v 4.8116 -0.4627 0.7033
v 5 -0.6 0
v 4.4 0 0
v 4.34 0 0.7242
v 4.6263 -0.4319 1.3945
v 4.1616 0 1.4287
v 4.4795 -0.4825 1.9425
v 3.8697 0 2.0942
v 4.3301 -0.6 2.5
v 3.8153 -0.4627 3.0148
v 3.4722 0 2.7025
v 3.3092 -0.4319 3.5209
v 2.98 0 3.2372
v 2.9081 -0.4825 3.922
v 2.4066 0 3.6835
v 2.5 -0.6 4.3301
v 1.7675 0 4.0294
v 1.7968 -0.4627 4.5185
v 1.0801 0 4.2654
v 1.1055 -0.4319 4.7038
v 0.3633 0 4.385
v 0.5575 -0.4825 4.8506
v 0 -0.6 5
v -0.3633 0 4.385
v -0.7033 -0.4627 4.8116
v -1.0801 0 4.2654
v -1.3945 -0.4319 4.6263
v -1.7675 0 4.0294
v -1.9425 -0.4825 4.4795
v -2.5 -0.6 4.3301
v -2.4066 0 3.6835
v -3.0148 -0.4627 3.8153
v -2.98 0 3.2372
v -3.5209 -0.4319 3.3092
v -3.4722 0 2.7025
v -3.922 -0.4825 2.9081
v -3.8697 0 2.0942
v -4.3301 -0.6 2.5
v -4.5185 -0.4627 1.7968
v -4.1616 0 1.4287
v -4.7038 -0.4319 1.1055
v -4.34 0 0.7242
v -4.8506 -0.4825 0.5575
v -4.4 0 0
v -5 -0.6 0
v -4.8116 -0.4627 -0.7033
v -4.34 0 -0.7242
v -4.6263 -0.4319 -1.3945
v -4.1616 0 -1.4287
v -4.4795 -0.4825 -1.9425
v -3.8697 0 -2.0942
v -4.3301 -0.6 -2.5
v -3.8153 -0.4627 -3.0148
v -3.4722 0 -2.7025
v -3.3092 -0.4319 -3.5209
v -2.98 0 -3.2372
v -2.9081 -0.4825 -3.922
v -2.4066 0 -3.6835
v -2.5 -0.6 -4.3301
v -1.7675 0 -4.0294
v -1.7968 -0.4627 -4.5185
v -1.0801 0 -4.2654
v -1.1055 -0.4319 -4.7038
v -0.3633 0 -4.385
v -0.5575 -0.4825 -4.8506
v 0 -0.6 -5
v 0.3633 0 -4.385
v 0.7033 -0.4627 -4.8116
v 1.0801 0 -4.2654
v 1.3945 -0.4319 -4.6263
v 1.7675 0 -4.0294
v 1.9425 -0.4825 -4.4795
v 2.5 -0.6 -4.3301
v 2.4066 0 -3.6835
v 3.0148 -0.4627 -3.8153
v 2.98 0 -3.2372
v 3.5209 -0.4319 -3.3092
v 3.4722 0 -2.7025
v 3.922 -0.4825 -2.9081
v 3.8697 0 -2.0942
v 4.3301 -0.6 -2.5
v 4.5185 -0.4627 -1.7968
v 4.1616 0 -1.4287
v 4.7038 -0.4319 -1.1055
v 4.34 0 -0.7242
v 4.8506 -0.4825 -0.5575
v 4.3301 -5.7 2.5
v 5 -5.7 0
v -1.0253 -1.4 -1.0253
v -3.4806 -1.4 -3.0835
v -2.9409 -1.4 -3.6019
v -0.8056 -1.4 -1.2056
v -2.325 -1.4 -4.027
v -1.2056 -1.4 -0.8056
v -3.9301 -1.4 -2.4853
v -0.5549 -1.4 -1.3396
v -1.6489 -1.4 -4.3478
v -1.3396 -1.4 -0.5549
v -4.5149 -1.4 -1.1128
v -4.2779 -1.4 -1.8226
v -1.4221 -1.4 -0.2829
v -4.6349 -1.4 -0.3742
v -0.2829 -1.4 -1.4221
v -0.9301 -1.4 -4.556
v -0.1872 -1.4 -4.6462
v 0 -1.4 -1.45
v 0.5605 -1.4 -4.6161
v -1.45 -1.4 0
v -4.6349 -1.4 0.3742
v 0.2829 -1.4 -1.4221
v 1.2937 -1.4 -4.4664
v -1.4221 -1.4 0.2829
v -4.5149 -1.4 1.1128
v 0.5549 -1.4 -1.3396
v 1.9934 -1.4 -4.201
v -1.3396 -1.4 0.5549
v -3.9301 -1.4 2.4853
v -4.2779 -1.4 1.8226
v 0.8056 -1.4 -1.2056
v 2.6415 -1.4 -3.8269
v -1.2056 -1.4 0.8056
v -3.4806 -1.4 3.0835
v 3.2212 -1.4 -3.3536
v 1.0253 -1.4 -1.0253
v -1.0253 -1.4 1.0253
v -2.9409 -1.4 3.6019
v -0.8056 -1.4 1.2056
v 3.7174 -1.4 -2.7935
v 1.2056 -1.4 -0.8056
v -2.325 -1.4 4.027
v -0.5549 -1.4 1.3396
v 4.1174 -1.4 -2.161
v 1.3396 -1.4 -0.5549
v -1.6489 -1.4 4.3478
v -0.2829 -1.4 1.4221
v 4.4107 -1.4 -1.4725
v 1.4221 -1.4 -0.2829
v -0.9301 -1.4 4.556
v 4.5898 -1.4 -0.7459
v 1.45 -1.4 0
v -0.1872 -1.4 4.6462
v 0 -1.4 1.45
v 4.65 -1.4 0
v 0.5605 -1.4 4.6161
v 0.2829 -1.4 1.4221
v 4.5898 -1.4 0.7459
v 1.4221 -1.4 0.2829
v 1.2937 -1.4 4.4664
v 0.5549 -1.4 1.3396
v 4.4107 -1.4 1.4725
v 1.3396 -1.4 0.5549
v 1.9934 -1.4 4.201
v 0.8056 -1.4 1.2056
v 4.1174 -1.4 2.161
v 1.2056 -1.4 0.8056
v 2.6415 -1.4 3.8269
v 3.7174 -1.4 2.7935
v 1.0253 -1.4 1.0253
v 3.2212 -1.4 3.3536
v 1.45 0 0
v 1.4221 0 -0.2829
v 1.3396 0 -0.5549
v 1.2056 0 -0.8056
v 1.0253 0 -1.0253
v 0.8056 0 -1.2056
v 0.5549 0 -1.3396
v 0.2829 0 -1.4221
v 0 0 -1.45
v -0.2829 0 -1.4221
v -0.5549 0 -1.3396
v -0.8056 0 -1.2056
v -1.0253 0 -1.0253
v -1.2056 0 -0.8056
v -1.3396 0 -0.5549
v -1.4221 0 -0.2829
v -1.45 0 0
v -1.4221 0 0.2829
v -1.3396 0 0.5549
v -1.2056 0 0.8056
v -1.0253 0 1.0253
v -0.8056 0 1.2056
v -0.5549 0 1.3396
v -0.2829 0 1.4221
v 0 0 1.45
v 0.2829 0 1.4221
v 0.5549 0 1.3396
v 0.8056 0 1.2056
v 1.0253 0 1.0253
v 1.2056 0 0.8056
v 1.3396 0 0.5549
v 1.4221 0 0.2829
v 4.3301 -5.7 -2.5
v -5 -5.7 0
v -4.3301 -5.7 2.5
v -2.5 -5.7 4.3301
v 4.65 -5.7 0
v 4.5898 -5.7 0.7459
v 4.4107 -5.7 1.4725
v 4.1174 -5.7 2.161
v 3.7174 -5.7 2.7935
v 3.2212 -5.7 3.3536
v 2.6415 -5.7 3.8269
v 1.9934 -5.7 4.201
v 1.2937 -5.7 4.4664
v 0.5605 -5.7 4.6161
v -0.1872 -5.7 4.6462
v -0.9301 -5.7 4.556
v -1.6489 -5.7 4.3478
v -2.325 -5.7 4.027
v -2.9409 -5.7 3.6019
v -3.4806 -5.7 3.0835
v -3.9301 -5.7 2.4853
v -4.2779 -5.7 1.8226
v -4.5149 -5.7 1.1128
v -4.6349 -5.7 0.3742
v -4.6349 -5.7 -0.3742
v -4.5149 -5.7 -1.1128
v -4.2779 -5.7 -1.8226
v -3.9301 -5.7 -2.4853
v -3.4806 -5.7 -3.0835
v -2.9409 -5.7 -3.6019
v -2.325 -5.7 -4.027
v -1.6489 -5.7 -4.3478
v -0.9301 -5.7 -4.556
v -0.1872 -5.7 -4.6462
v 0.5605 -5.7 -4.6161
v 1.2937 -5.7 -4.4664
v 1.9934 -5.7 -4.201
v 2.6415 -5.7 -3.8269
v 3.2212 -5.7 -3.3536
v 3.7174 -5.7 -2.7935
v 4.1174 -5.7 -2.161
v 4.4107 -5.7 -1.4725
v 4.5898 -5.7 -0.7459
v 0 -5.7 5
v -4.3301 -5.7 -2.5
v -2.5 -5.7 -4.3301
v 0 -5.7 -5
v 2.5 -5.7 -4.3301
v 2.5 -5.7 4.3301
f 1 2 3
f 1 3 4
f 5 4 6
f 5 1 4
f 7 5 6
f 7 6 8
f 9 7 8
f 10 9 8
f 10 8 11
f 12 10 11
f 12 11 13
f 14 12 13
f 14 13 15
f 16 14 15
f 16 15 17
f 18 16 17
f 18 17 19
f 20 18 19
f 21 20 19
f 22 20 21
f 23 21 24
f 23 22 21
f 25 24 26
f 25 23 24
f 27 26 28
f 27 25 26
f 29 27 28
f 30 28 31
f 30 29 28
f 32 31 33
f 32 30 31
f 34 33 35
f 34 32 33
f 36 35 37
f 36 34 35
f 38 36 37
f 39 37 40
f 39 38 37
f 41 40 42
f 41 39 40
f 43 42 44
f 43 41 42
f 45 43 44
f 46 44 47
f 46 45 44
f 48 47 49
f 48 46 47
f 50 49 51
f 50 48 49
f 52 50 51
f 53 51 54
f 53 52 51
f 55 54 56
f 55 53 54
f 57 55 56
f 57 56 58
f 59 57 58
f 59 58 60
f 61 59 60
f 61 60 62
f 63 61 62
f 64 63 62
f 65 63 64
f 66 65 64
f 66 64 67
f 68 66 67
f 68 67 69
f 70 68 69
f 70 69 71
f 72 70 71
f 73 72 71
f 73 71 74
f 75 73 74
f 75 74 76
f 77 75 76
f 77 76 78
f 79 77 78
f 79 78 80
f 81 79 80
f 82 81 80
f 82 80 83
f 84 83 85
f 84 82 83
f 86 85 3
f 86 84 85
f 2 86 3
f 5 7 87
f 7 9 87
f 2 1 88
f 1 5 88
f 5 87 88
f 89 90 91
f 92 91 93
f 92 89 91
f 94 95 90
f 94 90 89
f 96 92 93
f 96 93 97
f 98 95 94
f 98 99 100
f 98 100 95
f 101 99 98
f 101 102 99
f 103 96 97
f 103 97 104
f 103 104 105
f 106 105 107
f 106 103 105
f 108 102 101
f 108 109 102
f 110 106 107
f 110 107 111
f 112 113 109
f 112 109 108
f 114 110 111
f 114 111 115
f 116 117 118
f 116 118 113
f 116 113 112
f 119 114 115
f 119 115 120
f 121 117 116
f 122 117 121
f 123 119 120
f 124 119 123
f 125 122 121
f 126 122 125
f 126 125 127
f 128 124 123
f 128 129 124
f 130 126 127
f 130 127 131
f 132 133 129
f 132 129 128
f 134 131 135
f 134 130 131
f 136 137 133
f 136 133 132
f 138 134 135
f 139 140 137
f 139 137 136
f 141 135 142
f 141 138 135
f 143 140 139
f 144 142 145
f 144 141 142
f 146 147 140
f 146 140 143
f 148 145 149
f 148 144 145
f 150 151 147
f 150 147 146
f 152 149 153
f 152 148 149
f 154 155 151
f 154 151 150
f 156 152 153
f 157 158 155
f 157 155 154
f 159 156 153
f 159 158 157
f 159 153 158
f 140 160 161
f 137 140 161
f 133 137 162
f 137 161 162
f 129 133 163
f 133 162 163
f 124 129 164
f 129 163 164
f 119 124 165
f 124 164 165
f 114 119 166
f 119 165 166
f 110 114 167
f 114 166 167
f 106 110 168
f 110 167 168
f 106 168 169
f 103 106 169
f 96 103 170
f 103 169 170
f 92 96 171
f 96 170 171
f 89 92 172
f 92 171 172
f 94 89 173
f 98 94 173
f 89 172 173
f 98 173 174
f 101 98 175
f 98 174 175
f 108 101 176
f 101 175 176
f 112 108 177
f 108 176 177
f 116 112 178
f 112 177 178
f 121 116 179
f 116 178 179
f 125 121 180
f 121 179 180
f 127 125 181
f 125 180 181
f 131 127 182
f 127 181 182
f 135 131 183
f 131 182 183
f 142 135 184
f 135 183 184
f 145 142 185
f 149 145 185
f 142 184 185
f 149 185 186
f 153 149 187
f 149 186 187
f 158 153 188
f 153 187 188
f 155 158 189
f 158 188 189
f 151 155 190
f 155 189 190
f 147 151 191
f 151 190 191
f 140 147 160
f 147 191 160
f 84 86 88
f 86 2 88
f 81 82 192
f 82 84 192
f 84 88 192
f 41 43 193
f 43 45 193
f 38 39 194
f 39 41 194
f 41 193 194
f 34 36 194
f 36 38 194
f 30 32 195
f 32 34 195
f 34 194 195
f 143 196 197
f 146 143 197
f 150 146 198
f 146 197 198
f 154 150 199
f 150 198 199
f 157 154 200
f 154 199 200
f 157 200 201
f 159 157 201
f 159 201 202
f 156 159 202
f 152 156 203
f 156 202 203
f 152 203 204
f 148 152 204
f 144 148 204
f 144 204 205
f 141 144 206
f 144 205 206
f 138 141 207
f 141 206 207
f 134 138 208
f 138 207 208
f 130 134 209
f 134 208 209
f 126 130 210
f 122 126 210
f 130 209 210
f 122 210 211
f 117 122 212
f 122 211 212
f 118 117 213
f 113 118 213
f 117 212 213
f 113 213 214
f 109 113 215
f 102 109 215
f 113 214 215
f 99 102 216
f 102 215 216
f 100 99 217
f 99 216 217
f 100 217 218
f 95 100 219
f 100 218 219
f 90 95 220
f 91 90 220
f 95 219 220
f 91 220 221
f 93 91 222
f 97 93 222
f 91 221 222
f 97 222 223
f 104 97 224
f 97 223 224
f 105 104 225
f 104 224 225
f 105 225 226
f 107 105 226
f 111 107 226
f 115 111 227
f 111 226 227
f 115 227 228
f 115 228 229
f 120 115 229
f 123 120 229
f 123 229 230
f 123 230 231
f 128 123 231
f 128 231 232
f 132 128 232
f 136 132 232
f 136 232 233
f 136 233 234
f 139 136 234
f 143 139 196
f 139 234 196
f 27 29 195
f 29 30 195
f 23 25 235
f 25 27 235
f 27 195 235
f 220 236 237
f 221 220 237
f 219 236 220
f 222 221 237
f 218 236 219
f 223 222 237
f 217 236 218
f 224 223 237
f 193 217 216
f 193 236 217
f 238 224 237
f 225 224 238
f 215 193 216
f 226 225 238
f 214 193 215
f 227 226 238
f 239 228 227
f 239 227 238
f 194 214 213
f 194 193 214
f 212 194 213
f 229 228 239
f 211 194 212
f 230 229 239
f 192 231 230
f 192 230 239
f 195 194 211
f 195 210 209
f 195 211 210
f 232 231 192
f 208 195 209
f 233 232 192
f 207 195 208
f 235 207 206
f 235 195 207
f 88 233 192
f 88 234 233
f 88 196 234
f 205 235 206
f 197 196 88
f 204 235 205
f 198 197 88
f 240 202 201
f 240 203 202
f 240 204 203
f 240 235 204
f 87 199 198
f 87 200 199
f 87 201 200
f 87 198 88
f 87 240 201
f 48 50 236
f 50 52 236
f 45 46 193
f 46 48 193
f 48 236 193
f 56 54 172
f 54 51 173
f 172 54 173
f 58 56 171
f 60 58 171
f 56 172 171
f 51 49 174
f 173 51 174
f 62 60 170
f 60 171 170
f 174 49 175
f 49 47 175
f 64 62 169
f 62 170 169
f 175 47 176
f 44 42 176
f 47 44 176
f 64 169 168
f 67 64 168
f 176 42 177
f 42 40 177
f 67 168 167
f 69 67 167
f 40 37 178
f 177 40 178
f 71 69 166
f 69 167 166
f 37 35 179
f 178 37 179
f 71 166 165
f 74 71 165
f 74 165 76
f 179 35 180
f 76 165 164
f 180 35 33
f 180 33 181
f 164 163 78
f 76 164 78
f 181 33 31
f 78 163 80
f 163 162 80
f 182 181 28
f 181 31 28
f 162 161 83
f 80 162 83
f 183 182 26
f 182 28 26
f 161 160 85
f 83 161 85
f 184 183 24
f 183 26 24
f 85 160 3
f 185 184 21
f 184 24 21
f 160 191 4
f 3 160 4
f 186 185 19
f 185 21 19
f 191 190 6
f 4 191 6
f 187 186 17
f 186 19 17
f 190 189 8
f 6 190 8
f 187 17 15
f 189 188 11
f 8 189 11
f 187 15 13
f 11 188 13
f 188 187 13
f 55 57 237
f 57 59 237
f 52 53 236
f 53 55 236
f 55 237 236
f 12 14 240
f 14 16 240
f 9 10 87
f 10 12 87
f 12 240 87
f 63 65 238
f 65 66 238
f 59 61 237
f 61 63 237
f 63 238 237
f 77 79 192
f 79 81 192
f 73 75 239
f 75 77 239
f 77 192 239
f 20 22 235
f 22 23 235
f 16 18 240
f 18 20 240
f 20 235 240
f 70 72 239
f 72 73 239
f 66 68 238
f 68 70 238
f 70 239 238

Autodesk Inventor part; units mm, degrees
ref_plane "YZ Plane" through (0, 0, 0) normal (1, 0, 0) x (0, 1, 0)
ref_plane "XZ Plane" through (0, 0, 0) normal (0, 1, 0) x (-1, 0, 0)
ref_plane "XY Plane" through (0, 0, 0) normal (0, 0, 1) x (1, 0, 0)
sketch "Boceto1" plane through (0, 0, 0) normal (0, 1, 0) x (-1, 0, 0)
  circle A0 centre (0, 0) radius 1.45
  dimension "d3" = 2.9
extrude "Extrusión1" add sketch "Boceto1" along normal blind 25
sketch "Boceto3" plane through (0, 0, 0) normal (0, -1, 0) x (1, 0, 0)
  circle A0 centre (0, 0) radius 5
  dimension "d5" = 10
extrude "Extrusión2" add sketch "Boceto3" along normal blind 5.7
chamfer "Chaflán1" distance 0.6 angle 45 1 edges at (-5, 0, 0)
sketch "Boceto5" plane through (0, -5.7, 0) normal (0, -1, 0) x (1, 0, 0)
  line L0 (0, 0) -> (0, 5) construction
  line L1 (0, 0) -> (5, 0) construction
  line L2 (0, 0) -> (4.3301, -2.5) construction
  line L3 (0, 0) -> (5, 0) construction
  line L4 (0, 0) -> (2.5, -4.3301) construction
  line L5 (0, 0) -> (5, 0) construction
  line L6 (0, 0) -> (0, -5) construction
  line L7 (0, 0) -> (5, 0) construction
  line L8 (0, 0) -> (-5, 0) construction
  line L9 (0, 0) -> (-5, 0) construction
  line L10 (0, 0) -> (-4.3301, -2.5) construction
  line L11 (0, 0) -> (-2.5, -4.3301) construction
  line L12 (0, 0) -> (4.3301, 2.5) construction
  line L13 (0, 0) -> (2.5, 4.3301) construction
  line L14 (0, 0) -> (-4.3301, 2.5) construction
  line L15 (0, 0) -> (-2.5, 4.3301) construction
  line L16 (4.3301, -2.5) -> (2.5, -4.3301)
  line L17 (2.5, -4.3301) -> (0, -5)
  line L18 (0, -5) -> (-2.5, -4.3301)
  line L19 (-2.5, -4.3301) -> (-4.3301, -2.5)
  line L20 (-5, 0) -> (-4.3301, 2.5)
  line L21 (-4.3301, 2.5) -> (-2.5, 4.3301)
  line L22 (-2.5, 4.3301) -> (0, 5)
  line L23 (0, 5) -> (2.5, 4.3301)
  line L24 (2.5, 4.3301) -> (4.3301, 2.5)
  line L25 (4.3301, 2.5) -> (5, 0)
  line L26 (5, 0) -> (4.3301, -2.5)
  line L27 (-4.3301, -2.5) -> (-5, 0)
  circle A0 centre (0, 0) radius 5
  dimension "d13" = 5
  dimension "d14" = 30
  dimension "d16" = 60
extrude "Extrusión3" cut sketch "Boceto5" against normal blind 6 contours A0 L16 | L26 A0 | A0 L17 | L25 A0 | A0 L18 | L24 A0 | A0 L19 | L23 A0 | A0 L27 | L22 A0 | A0 L20 | L21 A0
sketch "Boceto7" plane through (0, 25, 0) normal (0, 1, 0) x (1, 0, 0)
  circle A0 centre (0, 0) radius 1.45
  dimension "d22" = 2.9
extrude "Extrusión5" cut sketch "Boceto7" against normal blind 29
sketch "Boceto8" plane through (0, -5.7, 0) normal (0, -1, 0) x (1, 0, 0)
  circle A0 centre (0, 0) radius 4.65
  dimension "d25" = 9.3
extrude "Extrusión6" cut sketch "Boceto8" against normal blind 4.3
thread "Rosca2" size "M9x1.25" class "6H" standard "ANSI Metric M Profile" full length
properties part number "Cubierta" material "Aluminio 6061"
